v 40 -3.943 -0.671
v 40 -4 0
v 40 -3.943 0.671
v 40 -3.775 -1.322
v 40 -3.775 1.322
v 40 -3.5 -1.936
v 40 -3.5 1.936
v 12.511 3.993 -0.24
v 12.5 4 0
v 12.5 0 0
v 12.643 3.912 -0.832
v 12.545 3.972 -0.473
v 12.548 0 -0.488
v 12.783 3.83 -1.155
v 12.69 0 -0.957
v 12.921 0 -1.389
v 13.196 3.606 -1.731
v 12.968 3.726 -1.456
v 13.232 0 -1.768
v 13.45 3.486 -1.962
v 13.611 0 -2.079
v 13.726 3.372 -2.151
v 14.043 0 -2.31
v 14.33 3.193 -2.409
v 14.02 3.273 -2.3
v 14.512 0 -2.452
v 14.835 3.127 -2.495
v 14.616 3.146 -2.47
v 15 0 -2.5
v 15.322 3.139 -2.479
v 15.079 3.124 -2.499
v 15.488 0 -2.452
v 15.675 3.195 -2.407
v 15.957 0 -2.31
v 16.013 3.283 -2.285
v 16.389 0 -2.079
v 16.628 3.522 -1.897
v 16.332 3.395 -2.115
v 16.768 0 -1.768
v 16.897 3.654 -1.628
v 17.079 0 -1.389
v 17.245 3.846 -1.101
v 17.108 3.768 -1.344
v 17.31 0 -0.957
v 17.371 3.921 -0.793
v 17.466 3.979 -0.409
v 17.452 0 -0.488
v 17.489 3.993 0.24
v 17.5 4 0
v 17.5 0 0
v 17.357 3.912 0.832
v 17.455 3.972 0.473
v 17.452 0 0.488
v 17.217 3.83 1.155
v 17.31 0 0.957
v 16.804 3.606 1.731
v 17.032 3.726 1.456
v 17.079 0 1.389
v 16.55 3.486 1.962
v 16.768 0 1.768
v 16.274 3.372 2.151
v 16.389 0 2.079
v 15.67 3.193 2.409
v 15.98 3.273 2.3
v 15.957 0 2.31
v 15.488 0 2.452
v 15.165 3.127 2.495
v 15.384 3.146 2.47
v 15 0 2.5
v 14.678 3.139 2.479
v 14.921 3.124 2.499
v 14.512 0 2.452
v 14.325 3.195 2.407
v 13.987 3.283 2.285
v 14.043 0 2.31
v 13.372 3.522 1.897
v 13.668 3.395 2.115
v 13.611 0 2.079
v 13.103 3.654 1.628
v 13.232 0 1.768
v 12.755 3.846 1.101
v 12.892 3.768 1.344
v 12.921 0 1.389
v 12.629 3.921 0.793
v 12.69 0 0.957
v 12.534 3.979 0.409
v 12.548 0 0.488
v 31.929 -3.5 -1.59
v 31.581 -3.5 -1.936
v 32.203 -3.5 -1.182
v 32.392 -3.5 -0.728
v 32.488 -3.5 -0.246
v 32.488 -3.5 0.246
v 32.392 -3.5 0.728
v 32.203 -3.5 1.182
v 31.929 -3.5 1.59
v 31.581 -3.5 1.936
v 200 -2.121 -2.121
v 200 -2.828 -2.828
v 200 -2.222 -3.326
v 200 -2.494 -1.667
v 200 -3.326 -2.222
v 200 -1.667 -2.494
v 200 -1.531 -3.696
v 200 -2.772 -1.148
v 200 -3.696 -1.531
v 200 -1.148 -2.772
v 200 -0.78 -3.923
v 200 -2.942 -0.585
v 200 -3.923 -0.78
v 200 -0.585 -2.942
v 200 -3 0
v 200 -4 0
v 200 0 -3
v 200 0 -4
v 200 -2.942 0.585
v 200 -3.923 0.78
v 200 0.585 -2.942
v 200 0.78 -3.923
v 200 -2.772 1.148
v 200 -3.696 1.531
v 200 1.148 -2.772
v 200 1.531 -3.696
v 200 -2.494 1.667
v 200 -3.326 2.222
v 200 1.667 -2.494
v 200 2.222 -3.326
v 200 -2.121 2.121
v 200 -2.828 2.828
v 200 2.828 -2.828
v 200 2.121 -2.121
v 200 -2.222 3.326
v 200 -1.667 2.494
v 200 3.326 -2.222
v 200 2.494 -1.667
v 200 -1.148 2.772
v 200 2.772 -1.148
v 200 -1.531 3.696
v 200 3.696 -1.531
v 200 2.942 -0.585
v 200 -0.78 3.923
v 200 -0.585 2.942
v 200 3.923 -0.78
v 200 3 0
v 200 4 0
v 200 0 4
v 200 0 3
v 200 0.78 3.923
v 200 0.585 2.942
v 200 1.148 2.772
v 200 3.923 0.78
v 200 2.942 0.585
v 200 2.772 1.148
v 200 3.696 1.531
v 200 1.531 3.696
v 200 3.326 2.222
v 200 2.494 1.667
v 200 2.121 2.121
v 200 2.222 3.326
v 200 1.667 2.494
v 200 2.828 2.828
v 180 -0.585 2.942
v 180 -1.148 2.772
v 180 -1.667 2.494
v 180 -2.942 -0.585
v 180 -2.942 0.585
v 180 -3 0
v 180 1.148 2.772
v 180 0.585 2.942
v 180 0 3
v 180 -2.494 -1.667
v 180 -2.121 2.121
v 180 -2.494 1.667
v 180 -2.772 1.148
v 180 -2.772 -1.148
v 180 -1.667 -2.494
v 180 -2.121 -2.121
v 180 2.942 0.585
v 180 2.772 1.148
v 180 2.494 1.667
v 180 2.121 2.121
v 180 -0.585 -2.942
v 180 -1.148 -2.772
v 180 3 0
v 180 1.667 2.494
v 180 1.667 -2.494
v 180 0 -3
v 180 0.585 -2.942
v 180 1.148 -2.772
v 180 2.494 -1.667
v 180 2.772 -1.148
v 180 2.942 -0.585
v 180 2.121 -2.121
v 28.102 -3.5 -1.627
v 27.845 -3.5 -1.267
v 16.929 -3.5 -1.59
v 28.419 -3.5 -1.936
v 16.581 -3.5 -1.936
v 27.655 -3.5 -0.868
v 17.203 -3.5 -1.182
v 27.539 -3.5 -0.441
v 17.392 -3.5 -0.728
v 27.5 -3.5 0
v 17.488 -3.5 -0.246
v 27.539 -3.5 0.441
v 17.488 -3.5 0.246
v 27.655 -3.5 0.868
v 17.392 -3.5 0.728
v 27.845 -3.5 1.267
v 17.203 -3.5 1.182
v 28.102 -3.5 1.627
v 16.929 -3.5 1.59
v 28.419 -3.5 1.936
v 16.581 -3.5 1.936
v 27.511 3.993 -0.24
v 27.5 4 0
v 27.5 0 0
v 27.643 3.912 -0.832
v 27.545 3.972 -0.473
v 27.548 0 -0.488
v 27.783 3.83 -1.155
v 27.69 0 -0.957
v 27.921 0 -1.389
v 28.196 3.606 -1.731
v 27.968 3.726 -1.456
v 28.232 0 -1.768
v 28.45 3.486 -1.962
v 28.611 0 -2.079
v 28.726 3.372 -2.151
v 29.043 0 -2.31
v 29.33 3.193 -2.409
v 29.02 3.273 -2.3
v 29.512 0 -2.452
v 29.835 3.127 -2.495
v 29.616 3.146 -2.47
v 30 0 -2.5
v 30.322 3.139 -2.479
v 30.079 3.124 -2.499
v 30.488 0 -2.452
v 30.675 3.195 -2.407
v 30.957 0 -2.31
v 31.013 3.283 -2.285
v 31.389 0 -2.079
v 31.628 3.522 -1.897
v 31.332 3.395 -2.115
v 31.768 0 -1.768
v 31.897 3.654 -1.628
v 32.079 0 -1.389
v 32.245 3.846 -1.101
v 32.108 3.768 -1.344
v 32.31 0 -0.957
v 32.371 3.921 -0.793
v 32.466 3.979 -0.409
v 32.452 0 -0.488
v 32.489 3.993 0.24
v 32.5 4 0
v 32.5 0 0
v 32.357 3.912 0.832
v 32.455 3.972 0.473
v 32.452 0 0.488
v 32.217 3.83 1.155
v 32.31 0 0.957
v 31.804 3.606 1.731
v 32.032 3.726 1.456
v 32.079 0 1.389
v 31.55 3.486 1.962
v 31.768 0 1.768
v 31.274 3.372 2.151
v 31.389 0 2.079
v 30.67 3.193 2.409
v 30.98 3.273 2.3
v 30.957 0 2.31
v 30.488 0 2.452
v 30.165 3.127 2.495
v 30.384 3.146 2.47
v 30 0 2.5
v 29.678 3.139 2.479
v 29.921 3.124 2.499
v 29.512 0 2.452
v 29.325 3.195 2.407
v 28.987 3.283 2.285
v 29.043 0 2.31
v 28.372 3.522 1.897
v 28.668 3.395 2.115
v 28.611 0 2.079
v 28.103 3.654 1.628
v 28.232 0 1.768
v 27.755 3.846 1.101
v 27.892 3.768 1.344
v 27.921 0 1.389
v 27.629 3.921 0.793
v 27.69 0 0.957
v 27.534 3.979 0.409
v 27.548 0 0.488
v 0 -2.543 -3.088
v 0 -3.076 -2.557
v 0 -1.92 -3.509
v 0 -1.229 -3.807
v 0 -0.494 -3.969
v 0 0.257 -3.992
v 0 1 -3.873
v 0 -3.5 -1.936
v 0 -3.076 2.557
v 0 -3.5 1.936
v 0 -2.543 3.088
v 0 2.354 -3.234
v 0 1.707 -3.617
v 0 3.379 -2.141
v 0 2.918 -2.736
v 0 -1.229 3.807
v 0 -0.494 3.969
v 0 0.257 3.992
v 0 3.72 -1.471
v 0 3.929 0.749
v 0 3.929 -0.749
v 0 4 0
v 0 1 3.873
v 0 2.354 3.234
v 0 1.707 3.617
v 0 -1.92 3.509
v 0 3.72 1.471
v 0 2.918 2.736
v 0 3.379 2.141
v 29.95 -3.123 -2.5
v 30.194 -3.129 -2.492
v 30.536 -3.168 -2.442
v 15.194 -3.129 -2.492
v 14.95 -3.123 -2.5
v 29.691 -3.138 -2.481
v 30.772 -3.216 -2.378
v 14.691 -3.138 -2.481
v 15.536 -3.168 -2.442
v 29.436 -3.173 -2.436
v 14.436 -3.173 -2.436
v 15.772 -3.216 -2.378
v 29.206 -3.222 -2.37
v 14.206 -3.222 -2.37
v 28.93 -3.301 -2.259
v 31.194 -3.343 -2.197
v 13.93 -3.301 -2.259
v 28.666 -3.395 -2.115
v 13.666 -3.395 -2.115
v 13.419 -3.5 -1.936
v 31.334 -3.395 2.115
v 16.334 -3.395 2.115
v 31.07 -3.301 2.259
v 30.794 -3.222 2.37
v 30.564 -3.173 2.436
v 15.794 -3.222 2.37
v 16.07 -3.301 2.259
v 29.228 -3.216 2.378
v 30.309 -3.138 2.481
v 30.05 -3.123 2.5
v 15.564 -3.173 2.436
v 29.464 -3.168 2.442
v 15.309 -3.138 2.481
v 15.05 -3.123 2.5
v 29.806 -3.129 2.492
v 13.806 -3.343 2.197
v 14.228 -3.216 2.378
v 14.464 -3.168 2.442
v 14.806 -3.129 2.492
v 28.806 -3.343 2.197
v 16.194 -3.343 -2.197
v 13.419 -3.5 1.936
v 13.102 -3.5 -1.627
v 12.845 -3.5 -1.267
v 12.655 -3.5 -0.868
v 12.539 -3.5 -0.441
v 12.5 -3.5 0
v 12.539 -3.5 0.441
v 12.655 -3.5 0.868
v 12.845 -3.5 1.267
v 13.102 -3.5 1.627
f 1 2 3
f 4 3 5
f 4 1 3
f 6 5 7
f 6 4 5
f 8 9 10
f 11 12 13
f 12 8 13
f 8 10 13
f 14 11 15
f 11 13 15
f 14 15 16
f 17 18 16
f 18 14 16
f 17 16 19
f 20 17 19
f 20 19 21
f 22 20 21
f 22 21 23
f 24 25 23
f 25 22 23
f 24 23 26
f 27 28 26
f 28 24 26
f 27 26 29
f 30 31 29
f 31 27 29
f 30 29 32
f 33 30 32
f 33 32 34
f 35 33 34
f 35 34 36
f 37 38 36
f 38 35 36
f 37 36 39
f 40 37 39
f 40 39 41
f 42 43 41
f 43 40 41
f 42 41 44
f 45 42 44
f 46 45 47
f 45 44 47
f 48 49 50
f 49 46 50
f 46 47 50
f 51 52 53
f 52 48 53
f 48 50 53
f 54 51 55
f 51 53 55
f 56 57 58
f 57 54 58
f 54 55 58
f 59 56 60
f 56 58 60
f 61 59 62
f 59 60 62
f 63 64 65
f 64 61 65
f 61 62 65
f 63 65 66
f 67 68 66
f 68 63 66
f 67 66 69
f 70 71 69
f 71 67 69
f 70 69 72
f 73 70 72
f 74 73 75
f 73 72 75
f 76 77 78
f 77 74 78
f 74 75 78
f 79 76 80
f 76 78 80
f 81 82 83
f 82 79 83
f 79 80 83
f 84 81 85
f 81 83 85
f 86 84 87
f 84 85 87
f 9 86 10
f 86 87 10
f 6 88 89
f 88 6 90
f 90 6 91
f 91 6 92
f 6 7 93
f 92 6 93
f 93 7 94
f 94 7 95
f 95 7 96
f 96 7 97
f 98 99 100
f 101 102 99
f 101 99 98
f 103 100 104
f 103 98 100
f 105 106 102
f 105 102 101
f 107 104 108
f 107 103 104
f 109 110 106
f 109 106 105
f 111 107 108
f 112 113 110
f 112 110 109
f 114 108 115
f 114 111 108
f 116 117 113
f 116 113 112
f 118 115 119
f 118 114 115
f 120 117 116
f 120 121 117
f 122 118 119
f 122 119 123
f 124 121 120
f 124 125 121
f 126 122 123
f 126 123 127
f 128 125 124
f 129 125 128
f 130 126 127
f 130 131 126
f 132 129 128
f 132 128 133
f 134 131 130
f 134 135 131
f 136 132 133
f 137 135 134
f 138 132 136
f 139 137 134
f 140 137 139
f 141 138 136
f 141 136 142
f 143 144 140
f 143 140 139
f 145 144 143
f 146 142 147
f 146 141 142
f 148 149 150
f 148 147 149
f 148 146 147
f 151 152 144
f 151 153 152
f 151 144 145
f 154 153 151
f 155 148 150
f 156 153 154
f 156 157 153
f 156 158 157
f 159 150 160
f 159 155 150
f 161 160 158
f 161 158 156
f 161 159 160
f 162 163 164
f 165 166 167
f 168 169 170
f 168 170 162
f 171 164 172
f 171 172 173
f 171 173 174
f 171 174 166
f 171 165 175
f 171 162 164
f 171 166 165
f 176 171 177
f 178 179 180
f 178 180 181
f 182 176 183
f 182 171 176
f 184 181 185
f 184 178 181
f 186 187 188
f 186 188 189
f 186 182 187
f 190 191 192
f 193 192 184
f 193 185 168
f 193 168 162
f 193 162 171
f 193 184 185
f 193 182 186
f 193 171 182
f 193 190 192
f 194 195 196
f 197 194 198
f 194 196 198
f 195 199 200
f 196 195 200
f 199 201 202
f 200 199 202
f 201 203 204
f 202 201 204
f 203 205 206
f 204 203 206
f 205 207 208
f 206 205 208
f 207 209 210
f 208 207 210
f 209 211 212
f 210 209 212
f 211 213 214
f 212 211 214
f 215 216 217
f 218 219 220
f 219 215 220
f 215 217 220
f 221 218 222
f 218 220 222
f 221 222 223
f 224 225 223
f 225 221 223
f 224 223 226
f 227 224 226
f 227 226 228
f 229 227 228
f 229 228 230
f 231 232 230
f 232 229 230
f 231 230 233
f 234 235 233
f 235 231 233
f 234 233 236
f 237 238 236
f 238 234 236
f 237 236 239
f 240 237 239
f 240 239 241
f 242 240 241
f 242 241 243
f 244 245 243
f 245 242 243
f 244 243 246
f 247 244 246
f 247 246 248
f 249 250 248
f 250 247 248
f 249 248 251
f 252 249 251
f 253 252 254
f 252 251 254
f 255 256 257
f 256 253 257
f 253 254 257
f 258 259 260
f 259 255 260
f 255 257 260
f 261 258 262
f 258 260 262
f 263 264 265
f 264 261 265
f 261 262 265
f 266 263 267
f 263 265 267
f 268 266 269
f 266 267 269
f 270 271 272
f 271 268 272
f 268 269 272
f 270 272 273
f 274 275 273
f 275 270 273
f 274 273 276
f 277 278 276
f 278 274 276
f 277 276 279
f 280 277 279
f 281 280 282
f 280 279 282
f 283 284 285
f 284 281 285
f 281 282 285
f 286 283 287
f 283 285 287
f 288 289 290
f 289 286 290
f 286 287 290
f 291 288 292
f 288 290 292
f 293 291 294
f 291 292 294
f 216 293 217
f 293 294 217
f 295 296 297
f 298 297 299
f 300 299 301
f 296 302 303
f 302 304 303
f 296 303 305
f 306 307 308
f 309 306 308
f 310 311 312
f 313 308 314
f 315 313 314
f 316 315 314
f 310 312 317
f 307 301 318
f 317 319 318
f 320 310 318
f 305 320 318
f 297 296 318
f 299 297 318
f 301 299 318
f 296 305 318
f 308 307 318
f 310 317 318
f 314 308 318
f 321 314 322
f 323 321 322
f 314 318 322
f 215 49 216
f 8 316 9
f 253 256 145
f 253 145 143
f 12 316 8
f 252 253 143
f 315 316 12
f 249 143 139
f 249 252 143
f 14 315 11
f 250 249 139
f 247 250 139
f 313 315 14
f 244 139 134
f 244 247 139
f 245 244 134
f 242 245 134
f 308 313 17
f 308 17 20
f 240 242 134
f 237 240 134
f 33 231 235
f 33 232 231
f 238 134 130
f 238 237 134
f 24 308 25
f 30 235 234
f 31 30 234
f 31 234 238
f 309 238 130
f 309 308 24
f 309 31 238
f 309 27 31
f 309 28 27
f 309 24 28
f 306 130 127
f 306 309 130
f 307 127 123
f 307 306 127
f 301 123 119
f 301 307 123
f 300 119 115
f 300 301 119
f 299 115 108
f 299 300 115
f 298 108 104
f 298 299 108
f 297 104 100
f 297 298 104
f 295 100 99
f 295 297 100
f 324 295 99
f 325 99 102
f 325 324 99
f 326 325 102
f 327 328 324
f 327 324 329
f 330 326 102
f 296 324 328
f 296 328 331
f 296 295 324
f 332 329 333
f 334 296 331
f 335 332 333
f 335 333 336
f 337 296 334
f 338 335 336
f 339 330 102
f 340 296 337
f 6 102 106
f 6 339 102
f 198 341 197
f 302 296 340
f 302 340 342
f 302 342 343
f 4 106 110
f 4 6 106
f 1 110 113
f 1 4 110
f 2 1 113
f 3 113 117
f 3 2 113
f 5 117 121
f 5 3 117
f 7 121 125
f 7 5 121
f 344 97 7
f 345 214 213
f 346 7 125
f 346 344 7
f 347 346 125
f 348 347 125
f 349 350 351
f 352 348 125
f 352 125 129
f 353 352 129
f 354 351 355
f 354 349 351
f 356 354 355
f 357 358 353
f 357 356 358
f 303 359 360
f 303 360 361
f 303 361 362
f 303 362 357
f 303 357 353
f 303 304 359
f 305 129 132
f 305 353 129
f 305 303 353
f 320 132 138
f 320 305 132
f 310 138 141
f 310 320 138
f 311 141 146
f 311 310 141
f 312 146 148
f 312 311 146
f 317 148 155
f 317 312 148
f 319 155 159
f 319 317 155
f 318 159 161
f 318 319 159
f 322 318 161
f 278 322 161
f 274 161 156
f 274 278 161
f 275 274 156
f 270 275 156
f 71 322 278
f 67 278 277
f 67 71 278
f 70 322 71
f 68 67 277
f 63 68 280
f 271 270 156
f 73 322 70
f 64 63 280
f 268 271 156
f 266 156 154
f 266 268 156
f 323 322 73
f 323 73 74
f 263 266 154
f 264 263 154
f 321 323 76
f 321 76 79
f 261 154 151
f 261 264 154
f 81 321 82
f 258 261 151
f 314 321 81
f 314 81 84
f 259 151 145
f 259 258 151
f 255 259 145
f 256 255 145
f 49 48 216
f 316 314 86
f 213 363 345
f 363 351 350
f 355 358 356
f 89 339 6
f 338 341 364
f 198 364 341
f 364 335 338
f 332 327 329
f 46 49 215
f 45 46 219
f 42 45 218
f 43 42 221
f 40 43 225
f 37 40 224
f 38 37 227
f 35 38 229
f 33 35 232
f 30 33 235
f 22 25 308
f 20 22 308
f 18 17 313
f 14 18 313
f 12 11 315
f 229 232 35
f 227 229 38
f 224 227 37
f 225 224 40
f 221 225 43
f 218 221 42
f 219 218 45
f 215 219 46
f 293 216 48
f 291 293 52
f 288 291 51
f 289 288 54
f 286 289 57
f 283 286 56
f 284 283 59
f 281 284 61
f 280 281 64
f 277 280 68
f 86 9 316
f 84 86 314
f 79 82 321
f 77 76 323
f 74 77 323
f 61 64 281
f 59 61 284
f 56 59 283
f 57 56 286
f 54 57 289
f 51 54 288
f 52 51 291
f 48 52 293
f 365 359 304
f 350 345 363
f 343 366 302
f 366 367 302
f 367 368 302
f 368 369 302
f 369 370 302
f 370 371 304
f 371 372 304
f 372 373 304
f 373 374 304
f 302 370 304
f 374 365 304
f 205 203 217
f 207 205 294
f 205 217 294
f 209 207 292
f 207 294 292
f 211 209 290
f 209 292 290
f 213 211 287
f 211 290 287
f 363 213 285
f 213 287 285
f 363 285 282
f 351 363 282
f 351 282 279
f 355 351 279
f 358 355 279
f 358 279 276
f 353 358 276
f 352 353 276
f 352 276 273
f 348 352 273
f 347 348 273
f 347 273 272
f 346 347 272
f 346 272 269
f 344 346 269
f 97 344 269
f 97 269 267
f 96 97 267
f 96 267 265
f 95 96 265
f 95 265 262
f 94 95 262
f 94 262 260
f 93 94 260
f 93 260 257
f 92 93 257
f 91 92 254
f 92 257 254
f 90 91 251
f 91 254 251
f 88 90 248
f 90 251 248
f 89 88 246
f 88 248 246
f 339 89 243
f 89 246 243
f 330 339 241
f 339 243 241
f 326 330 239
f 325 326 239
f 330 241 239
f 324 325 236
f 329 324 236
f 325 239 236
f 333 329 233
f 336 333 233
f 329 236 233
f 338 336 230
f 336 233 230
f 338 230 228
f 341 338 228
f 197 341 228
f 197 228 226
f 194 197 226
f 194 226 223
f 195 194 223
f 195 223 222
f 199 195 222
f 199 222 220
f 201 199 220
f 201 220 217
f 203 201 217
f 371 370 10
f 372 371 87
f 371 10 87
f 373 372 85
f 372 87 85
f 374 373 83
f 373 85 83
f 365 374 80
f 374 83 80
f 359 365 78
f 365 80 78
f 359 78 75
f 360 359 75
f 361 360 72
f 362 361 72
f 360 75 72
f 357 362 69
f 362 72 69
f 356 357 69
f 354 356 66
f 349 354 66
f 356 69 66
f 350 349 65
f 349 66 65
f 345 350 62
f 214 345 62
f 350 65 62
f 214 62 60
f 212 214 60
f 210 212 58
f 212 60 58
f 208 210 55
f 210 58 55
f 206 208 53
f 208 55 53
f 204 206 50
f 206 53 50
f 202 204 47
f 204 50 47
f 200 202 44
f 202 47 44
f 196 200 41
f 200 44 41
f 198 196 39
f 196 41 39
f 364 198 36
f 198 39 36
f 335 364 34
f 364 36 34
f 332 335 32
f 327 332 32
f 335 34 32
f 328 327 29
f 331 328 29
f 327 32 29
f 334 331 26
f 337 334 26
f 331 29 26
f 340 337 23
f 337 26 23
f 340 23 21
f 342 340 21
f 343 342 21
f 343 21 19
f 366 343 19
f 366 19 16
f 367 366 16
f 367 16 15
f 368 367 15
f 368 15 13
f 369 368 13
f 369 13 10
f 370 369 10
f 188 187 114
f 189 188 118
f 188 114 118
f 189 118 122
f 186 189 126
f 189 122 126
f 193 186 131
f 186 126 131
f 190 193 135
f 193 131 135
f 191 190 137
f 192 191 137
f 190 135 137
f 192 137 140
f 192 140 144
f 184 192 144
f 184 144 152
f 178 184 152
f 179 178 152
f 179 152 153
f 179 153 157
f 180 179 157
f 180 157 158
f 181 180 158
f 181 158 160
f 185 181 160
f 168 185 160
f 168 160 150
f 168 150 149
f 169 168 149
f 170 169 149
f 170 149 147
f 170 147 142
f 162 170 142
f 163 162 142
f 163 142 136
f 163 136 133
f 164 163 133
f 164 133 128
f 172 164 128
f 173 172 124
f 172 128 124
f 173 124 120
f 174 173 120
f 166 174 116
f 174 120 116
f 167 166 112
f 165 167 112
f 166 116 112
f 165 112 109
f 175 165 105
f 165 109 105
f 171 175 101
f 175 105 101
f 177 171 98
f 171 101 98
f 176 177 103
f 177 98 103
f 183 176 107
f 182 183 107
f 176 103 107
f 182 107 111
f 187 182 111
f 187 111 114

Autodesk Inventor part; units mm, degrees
ref_plane "YZ Plane" through (0, 0, 0) normal (1, 0, 0) x (0, 1, 0)
ref_plane "XY Plane" through (0, 0, 0) normal (0, 0, 1) x (1, 0, 0)
sketch "Sketch1" plane through (0, 0, 0) normal (1, 0, 0) x (0, 1, 0)
  circle A0 centre (0, 0) radius 4
  dimension "d0" = 8
extrude "Extrusion1" add sketch "Sketch1" along normal blind 200
sketch "Sketch2" plane through (0, 0, 0) normal (0, 1, 0) x (-1, 0, 0)
  line L0 (0, 0) -> (-15, 0)
  line L1 (-15, 0) -> (-30, 0)
  circle A0 centre (-30, 0) radius 2.5
  circle A1 centre (-15, 0) radius 2.5
  dimension "d3" = 15
  dimension "d4" = 15
  dimension "d5" = 5
  dimension "d6" = 5
extrude "Extrusion2" cut sketch "Sketch2" along normal mid plane 200
sketch "Sketch3" plane through (200, 0, 0) normal (1, 0, 0) x (0, 0, -1)
  circle A0 centre (0, 0) radius 3
  dimension "d9" = 6
extrude "Extrusion3" cut sketch "Sketch3" against normal blind 20
thread "Thread1" size "M6x1" class "6H" standard "ANSI Metric M Profile" length 15
ref_plane "Work Plane2" through (0, -4, 0) normal (0, 1, 0) x (-1, 0, 0)
sketch "Sketch4" plane through (0, -4, 0) normal (0, 1, 0) x (-1, 0, 0)
  line L0 (0, 4) -> (0, -4) projected
  line L1 (0, -4) -> (-200, -4) projected
  line L2 (0, 4) -> (-40, 4)
  line L3 (-40, 4) -> (-40, -4)
  line L4 (-40, -4) -> (0, -4)
  line L5 (0, -4) -> (0, 4)
  point P0 (0, 0)
  dimension "d16" = 40
extrude "Extrusion4" cut sketch "Sketch4" along normal blind 0.5
properties part number "counterweight-rod" material "Aluminum 6061"
